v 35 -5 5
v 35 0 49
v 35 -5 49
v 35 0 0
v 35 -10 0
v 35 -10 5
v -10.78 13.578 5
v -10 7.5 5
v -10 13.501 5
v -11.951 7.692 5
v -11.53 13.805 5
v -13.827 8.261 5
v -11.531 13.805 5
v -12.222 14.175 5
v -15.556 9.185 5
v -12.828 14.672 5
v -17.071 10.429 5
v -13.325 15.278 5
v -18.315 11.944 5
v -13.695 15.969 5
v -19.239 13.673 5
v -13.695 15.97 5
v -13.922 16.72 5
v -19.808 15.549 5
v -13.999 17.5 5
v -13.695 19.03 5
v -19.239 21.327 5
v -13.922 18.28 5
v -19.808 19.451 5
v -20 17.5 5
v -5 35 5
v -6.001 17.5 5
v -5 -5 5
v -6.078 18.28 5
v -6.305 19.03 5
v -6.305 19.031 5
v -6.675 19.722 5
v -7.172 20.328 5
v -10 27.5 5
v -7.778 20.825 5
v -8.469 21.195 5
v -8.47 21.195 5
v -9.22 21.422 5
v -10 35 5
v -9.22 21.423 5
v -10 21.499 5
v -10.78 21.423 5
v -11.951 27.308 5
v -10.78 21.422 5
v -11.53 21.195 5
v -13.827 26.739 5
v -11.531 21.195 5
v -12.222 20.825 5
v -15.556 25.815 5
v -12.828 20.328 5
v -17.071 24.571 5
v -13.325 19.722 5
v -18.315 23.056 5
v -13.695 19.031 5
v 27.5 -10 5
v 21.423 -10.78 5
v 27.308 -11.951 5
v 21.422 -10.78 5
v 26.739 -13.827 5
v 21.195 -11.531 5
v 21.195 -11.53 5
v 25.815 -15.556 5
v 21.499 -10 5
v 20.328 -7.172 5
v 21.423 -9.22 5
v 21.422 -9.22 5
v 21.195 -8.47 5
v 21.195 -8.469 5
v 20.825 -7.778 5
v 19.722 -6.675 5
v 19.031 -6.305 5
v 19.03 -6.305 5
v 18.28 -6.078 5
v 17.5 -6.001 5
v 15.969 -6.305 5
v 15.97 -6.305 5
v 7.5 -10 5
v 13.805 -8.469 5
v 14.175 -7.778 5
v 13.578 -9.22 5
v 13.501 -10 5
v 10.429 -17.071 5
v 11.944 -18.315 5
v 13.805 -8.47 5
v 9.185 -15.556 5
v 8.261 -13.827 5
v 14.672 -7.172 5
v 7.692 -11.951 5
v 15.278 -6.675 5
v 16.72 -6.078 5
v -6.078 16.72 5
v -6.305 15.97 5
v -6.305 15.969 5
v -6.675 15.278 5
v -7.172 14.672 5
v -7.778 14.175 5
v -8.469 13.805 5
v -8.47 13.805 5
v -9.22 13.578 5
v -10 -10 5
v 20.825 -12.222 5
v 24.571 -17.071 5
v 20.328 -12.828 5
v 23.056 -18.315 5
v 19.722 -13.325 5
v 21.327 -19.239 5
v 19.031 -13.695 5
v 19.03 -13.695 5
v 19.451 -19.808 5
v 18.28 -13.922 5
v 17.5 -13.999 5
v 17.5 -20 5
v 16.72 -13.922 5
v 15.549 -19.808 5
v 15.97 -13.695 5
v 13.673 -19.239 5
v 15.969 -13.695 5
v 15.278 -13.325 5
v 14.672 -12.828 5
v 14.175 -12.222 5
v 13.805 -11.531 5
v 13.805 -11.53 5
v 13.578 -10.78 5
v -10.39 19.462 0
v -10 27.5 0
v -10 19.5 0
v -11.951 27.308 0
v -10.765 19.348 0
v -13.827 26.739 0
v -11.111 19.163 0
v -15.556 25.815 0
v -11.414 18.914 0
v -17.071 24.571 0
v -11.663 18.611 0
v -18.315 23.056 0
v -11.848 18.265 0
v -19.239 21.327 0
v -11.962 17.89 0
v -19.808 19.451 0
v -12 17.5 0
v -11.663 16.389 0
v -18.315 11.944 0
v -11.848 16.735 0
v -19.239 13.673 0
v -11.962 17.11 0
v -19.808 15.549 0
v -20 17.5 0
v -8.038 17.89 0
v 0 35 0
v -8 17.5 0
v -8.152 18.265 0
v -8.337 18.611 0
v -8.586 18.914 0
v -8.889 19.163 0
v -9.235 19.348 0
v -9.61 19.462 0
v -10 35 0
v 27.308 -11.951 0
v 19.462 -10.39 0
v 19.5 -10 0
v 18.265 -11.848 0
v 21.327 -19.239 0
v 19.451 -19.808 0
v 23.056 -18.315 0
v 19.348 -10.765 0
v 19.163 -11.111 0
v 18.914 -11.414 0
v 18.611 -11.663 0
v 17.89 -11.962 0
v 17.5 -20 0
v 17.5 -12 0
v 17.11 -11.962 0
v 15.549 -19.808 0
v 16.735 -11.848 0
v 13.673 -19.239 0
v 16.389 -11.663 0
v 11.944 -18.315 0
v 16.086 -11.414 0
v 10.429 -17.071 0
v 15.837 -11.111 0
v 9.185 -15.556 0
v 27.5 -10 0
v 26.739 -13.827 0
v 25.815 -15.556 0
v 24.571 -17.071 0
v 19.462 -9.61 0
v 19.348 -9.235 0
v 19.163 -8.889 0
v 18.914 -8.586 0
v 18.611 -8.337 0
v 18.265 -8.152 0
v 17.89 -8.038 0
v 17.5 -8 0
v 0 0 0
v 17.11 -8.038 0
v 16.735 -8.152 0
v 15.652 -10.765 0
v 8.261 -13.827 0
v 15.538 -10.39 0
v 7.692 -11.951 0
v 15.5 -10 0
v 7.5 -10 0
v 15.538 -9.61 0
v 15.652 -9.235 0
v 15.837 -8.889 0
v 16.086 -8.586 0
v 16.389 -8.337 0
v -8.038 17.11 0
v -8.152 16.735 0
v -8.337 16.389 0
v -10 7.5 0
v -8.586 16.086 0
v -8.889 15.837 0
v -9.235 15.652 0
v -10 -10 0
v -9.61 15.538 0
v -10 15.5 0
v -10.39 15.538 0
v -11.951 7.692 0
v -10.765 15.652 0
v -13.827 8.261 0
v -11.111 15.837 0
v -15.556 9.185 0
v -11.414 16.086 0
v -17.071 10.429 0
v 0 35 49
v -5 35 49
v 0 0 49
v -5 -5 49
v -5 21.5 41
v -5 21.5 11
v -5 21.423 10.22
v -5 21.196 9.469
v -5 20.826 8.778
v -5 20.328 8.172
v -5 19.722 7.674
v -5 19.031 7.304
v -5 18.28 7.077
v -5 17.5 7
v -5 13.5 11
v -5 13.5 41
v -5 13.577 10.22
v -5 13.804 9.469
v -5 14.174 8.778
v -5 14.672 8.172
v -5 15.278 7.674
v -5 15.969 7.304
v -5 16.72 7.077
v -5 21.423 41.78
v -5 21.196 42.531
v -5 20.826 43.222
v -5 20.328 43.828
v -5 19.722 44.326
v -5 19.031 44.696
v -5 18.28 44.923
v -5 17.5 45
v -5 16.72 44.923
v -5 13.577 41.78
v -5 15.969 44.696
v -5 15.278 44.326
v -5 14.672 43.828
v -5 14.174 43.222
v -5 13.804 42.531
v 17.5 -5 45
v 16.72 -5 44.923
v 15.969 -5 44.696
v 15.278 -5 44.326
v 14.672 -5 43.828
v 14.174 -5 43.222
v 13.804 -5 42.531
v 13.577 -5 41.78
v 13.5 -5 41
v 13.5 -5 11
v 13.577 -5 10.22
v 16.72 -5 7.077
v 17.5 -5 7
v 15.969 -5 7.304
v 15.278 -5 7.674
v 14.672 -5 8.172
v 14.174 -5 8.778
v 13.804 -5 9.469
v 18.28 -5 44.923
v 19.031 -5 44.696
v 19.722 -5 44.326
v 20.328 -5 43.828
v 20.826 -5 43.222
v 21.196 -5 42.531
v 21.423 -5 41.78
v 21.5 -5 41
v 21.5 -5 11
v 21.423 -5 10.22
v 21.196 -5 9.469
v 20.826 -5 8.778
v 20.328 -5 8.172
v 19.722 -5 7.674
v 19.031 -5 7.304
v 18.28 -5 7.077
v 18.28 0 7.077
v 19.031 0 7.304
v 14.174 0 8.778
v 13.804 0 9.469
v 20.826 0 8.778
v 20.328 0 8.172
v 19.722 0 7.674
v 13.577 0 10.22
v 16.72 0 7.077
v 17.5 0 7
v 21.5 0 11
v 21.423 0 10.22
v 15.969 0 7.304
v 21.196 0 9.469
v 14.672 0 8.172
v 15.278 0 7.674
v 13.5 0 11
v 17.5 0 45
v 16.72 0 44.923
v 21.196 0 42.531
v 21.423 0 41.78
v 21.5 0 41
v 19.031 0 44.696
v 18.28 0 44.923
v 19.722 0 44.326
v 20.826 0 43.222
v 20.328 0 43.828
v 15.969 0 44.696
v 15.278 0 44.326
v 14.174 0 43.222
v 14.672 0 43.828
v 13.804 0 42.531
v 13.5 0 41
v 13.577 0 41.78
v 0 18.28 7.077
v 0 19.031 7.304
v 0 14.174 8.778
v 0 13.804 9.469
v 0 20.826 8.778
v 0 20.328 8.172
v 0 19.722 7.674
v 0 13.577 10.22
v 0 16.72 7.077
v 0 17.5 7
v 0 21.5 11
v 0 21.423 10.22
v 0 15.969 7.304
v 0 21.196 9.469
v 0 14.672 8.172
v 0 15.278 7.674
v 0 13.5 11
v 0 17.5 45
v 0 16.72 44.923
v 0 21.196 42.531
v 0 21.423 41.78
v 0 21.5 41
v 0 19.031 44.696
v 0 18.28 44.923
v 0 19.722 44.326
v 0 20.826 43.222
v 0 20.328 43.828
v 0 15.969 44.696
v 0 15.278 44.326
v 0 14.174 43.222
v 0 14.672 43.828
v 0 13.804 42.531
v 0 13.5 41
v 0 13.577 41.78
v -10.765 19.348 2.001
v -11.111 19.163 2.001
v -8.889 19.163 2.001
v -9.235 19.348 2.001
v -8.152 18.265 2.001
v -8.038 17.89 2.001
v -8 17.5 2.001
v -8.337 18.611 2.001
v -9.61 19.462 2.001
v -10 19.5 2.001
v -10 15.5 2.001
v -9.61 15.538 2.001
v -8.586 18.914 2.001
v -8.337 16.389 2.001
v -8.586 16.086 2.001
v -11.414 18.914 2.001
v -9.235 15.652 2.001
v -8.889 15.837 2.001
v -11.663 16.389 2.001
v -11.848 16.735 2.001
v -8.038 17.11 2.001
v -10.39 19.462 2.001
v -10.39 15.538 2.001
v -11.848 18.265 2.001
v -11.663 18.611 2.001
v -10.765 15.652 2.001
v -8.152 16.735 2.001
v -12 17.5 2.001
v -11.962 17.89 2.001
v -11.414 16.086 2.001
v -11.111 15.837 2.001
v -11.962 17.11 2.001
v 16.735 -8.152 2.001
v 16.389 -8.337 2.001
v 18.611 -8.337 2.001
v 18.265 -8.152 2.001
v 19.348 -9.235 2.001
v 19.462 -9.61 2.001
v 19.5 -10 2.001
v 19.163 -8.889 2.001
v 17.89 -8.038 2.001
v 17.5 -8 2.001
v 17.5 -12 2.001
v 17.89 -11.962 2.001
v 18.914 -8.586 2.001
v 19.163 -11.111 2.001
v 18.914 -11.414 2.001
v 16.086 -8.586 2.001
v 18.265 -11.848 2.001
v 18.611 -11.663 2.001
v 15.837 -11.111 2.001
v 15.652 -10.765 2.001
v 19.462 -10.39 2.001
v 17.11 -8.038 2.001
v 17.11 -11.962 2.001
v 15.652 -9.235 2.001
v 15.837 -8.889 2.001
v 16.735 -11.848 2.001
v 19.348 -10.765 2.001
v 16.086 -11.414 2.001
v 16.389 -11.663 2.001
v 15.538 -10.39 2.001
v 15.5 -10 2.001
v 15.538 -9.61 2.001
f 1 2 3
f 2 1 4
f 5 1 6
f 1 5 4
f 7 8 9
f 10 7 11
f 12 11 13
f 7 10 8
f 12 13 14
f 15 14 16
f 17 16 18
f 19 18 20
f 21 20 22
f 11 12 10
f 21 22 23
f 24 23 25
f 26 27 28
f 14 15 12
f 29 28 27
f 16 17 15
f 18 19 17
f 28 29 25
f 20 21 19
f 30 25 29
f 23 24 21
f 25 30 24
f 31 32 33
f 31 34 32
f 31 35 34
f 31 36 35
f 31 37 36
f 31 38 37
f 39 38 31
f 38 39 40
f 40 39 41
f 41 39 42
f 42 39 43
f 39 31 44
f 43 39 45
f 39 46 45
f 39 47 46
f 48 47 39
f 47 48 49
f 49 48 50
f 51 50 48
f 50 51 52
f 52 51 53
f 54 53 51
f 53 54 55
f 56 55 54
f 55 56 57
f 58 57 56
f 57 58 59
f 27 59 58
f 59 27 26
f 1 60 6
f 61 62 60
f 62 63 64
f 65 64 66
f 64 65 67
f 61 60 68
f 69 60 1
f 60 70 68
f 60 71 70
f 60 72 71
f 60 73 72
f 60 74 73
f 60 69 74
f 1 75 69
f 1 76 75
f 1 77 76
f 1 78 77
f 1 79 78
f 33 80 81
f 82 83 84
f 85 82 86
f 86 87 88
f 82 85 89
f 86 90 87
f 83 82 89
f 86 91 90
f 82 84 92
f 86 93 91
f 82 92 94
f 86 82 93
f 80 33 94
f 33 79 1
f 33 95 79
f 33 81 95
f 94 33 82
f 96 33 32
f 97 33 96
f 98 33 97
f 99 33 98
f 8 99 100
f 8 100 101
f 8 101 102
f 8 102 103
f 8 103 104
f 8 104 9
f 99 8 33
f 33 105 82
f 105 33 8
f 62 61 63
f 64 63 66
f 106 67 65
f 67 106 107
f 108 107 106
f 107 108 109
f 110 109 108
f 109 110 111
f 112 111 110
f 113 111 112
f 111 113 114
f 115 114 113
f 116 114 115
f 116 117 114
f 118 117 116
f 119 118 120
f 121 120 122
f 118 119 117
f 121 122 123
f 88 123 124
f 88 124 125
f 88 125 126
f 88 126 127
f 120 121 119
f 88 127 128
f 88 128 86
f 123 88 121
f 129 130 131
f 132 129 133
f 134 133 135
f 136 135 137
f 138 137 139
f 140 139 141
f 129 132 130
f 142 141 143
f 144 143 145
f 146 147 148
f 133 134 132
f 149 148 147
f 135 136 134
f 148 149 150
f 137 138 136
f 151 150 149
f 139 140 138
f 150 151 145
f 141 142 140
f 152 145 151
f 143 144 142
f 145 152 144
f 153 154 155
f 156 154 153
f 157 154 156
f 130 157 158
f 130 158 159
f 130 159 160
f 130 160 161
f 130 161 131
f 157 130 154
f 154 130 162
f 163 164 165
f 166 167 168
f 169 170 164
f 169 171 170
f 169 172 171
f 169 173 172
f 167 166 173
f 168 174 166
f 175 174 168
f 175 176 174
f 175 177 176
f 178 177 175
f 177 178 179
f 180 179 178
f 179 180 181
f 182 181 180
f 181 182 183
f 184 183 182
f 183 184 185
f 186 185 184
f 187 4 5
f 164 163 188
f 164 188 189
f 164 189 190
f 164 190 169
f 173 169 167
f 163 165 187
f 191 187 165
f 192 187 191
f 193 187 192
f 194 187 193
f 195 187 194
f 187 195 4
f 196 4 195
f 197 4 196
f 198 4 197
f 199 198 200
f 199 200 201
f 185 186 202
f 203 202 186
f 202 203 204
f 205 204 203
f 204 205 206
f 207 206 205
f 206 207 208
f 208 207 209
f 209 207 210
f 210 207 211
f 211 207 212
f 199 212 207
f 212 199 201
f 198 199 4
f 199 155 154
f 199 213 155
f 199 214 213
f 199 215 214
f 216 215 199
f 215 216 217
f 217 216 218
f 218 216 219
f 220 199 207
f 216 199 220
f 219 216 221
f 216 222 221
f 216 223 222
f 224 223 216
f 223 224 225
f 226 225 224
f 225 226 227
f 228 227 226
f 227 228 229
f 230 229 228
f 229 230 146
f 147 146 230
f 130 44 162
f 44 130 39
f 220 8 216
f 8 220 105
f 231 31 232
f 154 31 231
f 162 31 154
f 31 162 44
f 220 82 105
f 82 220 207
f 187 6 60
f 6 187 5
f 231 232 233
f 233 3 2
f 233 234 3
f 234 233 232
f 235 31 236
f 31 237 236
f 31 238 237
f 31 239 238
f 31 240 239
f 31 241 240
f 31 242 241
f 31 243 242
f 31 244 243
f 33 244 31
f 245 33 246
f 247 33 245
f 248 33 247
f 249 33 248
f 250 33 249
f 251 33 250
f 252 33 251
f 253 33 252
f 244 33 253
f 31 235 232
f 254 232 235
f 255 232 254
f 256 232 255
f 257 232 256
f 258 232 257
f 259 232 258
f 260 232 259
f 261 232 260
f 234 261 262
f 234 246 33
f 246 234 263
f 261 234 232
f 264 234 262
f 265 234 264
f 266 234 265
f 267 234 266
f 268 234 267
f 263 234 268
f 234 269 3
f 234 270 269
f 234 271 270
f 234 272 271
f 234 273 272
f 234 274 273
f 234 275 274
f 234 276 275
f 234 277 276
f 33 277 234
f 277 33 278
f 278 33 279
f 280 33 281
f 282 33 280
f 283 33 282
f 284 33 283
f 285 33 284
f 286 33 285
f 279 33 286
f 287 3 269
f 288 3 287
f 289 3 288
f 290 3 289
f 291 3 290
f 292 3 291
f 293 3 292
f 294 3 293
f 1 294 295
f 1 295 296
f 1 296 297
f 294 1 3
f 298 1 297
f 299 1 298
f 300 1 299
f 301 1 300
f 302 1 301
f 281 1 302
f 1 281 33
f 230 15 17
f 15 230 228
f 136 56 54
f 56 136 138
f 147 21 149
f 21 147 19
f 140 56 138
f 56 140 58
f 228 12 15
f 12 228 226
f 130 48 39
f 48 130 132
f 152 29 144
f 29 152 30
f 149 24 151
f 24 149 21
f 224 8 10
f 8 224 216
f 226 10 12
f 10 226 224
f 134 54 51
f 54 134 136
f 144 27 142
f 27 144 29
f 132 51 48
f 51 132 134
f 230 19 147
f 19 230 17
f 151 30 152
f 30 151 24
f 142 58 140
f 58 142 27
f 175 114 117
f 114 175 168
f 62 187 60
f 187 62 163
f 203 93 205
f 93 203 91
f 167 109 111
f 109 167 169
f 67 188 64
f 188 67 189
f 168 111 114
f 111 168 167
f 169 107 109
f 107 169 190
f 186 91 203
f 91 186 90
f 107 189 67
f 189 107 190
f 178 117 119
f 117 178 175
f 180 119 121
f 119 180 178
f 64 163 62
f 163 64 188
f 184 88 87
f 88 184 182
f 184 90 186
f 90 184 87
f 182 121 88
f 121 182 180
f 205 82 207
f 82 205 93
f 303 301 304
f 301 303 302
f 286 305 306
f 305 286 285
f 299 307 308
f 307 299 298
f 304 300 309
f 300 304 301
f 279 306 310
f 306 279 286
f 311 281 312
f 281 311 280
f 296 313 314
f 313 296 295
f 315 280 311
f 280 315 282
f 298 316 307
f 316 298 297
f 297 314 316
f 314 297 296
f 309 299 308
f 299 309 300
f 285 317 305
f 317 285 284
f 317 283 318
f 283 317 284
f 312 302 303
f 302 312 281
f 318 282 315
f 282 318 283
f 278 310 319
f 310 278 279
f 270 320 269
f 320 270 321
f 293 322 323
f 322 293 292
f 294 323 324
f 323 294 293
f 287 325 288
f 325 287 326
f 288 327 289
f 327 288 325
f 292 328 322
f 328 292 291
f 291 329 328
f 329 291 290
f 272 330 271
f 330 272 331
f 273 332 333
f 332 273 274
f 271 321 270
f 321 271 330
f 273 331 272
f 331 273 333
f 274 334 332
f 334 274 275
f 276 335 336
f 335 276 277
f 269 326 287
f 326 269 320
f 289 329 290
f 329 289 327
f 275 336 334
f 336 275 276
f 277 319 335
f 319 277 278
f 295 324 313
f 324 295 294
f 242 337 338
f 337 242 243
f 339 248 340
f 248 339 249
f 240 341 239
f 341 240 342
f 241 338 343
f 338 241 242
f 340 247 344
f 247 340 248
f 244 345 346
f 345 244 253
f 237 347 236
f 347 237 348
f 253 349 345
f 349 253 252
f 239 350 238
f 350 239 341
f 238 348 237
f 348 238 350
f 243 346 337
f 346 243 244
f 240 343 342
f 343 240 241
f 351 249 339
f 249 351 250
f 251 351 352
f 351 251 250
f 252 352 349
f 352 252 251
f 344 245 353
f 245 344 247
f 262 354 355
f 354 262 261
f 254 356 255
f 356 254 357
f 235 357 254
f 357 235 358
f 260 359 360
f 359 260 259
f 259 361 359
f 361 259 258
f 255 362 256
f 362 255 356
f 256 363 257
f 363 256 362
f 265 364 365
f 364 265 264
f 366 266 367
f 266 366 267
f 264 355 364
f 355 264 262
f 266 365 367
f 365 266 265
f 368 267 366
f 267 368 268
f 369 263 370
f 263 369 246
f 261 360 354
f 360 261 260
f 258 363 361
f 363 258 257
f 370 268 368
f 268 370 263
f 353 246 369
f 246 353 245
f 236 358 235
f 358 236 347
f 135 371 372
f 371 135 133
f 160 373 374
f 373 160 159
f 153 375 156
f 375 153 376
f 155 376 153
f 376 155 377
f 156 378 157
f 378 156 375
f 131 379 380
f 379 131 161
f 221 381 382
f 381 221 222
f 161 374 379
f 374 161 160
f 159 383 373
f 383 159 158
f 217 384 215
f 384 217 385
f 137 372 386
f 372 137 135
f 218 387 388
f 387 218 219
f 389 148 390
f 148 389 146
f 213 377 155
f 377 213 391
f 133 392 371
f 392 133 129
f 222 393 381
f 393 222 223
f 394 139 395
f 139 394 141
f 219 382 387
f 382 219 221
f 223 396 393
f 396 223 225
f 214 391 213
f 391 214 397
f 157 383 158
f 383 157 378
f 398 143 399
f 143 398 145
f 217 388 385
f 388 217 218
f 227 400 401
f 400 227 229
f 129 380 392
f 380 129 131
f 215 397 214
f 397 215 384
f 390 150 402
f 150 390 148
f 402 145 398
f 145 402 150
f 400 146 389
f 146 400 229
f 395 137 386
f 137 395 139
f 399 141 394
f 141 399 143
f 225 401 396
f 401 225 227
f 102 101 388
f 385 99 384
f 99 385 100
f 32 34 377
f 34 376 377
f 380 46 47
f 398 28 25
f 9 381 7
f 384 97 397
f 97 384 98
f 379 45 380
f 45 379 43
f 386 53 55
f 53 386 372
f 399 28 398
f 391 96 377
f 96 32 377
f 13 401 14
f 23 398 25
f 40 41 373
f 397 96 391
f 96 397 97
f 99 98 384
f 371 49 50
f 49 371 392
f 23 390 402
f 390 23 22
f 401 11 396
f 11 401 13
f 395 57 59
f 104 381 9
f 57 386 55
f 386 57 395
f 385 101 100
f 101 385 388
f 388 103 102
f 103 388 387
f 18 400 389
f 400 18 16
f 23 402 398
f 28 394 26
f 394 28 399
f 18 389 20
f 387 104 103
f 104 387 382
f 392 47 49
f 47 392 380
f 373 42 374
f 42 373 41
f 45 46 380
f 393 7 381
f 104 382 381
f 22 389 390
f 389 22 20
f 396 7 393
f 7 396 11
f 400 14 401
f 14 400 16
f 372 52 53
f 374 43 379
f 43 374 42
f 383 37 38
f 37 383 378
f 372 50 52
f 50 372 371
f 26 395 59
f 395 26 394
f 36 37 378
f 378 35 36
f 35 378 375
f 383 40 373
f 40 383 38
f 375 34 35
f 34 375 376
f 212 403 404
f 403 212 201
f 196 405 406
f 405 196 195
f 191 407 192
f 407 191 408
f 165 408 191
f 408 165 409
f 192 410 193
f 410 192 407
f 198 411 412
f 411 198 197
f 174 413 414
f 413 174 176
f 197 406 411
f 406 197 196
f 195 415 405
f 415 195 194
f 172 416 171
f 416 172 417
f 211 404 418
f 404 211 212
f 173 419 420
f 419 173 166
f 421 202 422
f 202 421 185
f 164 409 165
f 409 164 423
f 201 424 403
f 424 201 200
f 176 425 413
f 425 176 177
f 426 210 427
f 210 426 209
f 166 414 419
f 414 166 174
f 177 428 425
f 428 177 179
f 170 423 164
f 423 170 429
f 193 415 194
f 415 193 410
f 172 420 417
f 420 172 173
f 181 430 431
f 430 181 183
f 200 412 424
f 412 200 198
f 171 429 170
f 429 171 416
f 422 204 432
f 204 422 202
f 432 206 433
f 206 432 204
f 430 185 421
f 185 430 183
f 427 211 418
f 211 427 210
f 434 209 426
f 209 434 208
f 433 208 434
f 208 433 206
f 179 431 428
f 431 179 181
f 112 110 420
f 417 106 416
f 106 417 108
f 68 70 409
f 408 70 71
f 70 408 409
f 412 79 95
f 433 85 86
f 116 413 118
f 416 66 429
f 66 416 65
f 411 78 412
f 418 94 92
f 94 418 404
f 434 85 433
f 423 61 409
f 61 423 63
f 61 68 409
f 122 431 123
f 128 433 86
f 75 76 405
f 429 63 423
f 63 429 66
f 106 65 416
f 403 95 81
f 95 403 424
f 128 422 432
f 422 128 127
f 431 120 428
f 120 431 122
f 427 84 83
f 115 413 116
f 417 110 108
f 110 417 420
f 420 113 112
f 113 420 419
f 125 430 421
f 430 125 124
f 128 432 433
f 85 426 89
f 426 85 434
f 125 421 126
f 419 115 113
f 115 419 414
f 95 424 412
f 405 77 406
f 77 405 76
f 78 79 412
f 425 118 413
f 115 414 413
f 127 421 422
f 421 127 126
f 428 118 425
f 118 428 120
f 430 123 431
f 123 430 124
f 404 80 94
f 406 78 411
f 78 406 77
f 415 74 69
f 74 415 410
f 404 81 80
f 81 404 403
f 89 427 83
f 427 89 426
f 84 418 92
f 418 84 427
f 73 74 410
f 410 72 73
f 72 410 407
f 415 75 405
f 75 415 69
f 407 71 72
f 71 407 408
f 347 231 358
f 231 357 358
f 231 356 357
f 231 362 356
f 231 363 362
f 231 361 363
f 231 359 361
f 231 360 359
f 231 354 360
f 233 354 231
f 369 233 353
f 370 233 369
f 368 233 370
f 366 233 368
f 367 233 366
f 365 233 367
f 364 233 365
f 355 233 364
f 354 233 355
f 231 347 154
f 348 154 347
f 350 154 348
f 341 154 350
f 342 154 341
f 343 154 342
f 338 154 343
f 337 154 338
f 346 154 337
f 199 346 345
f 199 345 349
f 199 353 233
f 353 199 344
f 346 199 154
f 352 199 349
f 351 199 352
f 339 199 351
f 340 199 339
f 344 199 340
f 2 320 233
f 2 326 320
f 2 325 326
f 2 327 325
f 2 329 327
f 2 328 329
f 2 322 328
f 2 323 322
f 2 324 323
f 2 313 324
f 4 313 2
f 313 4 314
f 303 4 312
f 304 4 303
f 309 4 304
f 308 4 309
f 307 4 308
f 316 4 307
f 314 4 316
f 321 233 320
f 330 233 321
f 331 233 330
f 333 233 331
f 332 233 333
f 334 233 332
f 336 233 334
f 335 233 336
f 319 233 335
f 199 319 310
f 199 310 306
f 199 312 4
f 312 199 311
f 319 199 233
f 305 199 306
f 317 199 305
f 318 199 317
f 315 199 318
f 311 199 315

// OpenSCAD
module foot() {
     difference(){
        // Bloque principal
        union(){
            translate([-10,-10,0]) cube([35 + 10, 35 + 10, 5]);
            translate([-5,-5,0]) cube([35 + 5, 35 + 5, 24]);
            translate([-10,35/2,2.5]) cylinder(r = 10, h = 5, center = true, $fn= 32);
            translate([35/2,-10,2.5]) cylinder(r = 10, h = 5, center = true, $fn= 32);
        } 
        // Recorte de la pata
        translate([0,0,-0.001]) cube([35 + 0.001, 35 + 0.001, 24 + 0.002]);  
        // Agujeros de los tornillos de 8mm
        for (i = [0:90:90]) {
            rotate([0,0,i]) {                
                translate([35/2, 0, 25/2 + 1 - 2.5]) rotate([90,0,0]) cylinder(d = 8, h = 12, center = true, $fn= 32);
                translate([35/2, 0, 25/2 + 1 + 2.5]) rotate([90,0,0]) cylinder(d = 8, h = 12, center = true, $fn= 32);
                translate([35/2, 0, 25/2 + 1]) rotate([90,0,0]) cube([8,5,30], center = true);
            }
        }  
        // Agujeros de los tornillos de 3.5mm   
        translate([-10,35/2,0]) {
            cylinder(d = 4, h = 12, center = true, $fn= 32);  
            translate([0,0,3.5 + 0.001]) cylinder(r1 = 4/2, r2 = 8/2, h = 3, center = true, $fn= 32);  
        }    
        translate([35/2,-10,0]) {
            cylinder(d = 4, h = 12, center = true, $fn= 32);  
            translate([0,0,3.5 + 0.001]) cylinder(r1 = 4/2, r2 = 8/2, h = 3, center = true, $fn= 32);  
        }  
     }
}

module footXL() {
     difference(){
        // Bloque principal
        union(){
            translate([-10,-10,0]) cube([35 + 10, 35 + 10, 5]);
            translate([-5,-5,0]) cube([35 + 5, 35 + 5, 49]);
            translate([-10,35/2,2.5]) cylinder(r = 10, h = 5, center = true, $fn= 32);
            translate([35/2,-10,2.5]) cylinder(r = 10, h = 5, center = true, $fn= 32);
        } 
        // Recorte de la pata
        translate([0,0,-0.001]) cube([35 + 0.001, 35 + 0.001, 49 + 0.002]);  
        // Agujeros de los tornillos de 8mm
        for (i = [0:90:90]) {
            rotate([0,0,i]) {                
                translate([35/2, 0, 25/2 + 13.5 - 15]) rotate([90,0,0]) cylinder(d = 8, h = 12, center = true, $fn= 32);
                translate([35/2, 0, 25/2 + 13.5 + 15]) rotate([90,0,0]) cylinder(d = 8, h = 12, center = true, $fn= 32);
                translate([35/2, 0, 25/2 + 13.5]) rotate([90,0,0]) cube([8,30,30], center = true);
            }
        }  
        // Agujeros de los tornillos de 3.5mm   
        translate([-10,35/2,0]) {
            cylinder(d = 4, h = 12, center = true, $fn= 32);  
            translate([0,0,3.5 + 0.001]) cylinder(r1 = 4/2, r2 = 8/2, h = 3, center = true, $fn= 32);  
        }    
        translate([35/2,-10,0]) {
            cylinder(d = 4, h = 12, center = true, $fn= 32);  
            translate([0,0,3.5 + 0.001]) cylinder(r1 = 4/2, r2 = 8/2, h = 3, center = true, $fn= 32);  
        }  
     }
}

footXL();
